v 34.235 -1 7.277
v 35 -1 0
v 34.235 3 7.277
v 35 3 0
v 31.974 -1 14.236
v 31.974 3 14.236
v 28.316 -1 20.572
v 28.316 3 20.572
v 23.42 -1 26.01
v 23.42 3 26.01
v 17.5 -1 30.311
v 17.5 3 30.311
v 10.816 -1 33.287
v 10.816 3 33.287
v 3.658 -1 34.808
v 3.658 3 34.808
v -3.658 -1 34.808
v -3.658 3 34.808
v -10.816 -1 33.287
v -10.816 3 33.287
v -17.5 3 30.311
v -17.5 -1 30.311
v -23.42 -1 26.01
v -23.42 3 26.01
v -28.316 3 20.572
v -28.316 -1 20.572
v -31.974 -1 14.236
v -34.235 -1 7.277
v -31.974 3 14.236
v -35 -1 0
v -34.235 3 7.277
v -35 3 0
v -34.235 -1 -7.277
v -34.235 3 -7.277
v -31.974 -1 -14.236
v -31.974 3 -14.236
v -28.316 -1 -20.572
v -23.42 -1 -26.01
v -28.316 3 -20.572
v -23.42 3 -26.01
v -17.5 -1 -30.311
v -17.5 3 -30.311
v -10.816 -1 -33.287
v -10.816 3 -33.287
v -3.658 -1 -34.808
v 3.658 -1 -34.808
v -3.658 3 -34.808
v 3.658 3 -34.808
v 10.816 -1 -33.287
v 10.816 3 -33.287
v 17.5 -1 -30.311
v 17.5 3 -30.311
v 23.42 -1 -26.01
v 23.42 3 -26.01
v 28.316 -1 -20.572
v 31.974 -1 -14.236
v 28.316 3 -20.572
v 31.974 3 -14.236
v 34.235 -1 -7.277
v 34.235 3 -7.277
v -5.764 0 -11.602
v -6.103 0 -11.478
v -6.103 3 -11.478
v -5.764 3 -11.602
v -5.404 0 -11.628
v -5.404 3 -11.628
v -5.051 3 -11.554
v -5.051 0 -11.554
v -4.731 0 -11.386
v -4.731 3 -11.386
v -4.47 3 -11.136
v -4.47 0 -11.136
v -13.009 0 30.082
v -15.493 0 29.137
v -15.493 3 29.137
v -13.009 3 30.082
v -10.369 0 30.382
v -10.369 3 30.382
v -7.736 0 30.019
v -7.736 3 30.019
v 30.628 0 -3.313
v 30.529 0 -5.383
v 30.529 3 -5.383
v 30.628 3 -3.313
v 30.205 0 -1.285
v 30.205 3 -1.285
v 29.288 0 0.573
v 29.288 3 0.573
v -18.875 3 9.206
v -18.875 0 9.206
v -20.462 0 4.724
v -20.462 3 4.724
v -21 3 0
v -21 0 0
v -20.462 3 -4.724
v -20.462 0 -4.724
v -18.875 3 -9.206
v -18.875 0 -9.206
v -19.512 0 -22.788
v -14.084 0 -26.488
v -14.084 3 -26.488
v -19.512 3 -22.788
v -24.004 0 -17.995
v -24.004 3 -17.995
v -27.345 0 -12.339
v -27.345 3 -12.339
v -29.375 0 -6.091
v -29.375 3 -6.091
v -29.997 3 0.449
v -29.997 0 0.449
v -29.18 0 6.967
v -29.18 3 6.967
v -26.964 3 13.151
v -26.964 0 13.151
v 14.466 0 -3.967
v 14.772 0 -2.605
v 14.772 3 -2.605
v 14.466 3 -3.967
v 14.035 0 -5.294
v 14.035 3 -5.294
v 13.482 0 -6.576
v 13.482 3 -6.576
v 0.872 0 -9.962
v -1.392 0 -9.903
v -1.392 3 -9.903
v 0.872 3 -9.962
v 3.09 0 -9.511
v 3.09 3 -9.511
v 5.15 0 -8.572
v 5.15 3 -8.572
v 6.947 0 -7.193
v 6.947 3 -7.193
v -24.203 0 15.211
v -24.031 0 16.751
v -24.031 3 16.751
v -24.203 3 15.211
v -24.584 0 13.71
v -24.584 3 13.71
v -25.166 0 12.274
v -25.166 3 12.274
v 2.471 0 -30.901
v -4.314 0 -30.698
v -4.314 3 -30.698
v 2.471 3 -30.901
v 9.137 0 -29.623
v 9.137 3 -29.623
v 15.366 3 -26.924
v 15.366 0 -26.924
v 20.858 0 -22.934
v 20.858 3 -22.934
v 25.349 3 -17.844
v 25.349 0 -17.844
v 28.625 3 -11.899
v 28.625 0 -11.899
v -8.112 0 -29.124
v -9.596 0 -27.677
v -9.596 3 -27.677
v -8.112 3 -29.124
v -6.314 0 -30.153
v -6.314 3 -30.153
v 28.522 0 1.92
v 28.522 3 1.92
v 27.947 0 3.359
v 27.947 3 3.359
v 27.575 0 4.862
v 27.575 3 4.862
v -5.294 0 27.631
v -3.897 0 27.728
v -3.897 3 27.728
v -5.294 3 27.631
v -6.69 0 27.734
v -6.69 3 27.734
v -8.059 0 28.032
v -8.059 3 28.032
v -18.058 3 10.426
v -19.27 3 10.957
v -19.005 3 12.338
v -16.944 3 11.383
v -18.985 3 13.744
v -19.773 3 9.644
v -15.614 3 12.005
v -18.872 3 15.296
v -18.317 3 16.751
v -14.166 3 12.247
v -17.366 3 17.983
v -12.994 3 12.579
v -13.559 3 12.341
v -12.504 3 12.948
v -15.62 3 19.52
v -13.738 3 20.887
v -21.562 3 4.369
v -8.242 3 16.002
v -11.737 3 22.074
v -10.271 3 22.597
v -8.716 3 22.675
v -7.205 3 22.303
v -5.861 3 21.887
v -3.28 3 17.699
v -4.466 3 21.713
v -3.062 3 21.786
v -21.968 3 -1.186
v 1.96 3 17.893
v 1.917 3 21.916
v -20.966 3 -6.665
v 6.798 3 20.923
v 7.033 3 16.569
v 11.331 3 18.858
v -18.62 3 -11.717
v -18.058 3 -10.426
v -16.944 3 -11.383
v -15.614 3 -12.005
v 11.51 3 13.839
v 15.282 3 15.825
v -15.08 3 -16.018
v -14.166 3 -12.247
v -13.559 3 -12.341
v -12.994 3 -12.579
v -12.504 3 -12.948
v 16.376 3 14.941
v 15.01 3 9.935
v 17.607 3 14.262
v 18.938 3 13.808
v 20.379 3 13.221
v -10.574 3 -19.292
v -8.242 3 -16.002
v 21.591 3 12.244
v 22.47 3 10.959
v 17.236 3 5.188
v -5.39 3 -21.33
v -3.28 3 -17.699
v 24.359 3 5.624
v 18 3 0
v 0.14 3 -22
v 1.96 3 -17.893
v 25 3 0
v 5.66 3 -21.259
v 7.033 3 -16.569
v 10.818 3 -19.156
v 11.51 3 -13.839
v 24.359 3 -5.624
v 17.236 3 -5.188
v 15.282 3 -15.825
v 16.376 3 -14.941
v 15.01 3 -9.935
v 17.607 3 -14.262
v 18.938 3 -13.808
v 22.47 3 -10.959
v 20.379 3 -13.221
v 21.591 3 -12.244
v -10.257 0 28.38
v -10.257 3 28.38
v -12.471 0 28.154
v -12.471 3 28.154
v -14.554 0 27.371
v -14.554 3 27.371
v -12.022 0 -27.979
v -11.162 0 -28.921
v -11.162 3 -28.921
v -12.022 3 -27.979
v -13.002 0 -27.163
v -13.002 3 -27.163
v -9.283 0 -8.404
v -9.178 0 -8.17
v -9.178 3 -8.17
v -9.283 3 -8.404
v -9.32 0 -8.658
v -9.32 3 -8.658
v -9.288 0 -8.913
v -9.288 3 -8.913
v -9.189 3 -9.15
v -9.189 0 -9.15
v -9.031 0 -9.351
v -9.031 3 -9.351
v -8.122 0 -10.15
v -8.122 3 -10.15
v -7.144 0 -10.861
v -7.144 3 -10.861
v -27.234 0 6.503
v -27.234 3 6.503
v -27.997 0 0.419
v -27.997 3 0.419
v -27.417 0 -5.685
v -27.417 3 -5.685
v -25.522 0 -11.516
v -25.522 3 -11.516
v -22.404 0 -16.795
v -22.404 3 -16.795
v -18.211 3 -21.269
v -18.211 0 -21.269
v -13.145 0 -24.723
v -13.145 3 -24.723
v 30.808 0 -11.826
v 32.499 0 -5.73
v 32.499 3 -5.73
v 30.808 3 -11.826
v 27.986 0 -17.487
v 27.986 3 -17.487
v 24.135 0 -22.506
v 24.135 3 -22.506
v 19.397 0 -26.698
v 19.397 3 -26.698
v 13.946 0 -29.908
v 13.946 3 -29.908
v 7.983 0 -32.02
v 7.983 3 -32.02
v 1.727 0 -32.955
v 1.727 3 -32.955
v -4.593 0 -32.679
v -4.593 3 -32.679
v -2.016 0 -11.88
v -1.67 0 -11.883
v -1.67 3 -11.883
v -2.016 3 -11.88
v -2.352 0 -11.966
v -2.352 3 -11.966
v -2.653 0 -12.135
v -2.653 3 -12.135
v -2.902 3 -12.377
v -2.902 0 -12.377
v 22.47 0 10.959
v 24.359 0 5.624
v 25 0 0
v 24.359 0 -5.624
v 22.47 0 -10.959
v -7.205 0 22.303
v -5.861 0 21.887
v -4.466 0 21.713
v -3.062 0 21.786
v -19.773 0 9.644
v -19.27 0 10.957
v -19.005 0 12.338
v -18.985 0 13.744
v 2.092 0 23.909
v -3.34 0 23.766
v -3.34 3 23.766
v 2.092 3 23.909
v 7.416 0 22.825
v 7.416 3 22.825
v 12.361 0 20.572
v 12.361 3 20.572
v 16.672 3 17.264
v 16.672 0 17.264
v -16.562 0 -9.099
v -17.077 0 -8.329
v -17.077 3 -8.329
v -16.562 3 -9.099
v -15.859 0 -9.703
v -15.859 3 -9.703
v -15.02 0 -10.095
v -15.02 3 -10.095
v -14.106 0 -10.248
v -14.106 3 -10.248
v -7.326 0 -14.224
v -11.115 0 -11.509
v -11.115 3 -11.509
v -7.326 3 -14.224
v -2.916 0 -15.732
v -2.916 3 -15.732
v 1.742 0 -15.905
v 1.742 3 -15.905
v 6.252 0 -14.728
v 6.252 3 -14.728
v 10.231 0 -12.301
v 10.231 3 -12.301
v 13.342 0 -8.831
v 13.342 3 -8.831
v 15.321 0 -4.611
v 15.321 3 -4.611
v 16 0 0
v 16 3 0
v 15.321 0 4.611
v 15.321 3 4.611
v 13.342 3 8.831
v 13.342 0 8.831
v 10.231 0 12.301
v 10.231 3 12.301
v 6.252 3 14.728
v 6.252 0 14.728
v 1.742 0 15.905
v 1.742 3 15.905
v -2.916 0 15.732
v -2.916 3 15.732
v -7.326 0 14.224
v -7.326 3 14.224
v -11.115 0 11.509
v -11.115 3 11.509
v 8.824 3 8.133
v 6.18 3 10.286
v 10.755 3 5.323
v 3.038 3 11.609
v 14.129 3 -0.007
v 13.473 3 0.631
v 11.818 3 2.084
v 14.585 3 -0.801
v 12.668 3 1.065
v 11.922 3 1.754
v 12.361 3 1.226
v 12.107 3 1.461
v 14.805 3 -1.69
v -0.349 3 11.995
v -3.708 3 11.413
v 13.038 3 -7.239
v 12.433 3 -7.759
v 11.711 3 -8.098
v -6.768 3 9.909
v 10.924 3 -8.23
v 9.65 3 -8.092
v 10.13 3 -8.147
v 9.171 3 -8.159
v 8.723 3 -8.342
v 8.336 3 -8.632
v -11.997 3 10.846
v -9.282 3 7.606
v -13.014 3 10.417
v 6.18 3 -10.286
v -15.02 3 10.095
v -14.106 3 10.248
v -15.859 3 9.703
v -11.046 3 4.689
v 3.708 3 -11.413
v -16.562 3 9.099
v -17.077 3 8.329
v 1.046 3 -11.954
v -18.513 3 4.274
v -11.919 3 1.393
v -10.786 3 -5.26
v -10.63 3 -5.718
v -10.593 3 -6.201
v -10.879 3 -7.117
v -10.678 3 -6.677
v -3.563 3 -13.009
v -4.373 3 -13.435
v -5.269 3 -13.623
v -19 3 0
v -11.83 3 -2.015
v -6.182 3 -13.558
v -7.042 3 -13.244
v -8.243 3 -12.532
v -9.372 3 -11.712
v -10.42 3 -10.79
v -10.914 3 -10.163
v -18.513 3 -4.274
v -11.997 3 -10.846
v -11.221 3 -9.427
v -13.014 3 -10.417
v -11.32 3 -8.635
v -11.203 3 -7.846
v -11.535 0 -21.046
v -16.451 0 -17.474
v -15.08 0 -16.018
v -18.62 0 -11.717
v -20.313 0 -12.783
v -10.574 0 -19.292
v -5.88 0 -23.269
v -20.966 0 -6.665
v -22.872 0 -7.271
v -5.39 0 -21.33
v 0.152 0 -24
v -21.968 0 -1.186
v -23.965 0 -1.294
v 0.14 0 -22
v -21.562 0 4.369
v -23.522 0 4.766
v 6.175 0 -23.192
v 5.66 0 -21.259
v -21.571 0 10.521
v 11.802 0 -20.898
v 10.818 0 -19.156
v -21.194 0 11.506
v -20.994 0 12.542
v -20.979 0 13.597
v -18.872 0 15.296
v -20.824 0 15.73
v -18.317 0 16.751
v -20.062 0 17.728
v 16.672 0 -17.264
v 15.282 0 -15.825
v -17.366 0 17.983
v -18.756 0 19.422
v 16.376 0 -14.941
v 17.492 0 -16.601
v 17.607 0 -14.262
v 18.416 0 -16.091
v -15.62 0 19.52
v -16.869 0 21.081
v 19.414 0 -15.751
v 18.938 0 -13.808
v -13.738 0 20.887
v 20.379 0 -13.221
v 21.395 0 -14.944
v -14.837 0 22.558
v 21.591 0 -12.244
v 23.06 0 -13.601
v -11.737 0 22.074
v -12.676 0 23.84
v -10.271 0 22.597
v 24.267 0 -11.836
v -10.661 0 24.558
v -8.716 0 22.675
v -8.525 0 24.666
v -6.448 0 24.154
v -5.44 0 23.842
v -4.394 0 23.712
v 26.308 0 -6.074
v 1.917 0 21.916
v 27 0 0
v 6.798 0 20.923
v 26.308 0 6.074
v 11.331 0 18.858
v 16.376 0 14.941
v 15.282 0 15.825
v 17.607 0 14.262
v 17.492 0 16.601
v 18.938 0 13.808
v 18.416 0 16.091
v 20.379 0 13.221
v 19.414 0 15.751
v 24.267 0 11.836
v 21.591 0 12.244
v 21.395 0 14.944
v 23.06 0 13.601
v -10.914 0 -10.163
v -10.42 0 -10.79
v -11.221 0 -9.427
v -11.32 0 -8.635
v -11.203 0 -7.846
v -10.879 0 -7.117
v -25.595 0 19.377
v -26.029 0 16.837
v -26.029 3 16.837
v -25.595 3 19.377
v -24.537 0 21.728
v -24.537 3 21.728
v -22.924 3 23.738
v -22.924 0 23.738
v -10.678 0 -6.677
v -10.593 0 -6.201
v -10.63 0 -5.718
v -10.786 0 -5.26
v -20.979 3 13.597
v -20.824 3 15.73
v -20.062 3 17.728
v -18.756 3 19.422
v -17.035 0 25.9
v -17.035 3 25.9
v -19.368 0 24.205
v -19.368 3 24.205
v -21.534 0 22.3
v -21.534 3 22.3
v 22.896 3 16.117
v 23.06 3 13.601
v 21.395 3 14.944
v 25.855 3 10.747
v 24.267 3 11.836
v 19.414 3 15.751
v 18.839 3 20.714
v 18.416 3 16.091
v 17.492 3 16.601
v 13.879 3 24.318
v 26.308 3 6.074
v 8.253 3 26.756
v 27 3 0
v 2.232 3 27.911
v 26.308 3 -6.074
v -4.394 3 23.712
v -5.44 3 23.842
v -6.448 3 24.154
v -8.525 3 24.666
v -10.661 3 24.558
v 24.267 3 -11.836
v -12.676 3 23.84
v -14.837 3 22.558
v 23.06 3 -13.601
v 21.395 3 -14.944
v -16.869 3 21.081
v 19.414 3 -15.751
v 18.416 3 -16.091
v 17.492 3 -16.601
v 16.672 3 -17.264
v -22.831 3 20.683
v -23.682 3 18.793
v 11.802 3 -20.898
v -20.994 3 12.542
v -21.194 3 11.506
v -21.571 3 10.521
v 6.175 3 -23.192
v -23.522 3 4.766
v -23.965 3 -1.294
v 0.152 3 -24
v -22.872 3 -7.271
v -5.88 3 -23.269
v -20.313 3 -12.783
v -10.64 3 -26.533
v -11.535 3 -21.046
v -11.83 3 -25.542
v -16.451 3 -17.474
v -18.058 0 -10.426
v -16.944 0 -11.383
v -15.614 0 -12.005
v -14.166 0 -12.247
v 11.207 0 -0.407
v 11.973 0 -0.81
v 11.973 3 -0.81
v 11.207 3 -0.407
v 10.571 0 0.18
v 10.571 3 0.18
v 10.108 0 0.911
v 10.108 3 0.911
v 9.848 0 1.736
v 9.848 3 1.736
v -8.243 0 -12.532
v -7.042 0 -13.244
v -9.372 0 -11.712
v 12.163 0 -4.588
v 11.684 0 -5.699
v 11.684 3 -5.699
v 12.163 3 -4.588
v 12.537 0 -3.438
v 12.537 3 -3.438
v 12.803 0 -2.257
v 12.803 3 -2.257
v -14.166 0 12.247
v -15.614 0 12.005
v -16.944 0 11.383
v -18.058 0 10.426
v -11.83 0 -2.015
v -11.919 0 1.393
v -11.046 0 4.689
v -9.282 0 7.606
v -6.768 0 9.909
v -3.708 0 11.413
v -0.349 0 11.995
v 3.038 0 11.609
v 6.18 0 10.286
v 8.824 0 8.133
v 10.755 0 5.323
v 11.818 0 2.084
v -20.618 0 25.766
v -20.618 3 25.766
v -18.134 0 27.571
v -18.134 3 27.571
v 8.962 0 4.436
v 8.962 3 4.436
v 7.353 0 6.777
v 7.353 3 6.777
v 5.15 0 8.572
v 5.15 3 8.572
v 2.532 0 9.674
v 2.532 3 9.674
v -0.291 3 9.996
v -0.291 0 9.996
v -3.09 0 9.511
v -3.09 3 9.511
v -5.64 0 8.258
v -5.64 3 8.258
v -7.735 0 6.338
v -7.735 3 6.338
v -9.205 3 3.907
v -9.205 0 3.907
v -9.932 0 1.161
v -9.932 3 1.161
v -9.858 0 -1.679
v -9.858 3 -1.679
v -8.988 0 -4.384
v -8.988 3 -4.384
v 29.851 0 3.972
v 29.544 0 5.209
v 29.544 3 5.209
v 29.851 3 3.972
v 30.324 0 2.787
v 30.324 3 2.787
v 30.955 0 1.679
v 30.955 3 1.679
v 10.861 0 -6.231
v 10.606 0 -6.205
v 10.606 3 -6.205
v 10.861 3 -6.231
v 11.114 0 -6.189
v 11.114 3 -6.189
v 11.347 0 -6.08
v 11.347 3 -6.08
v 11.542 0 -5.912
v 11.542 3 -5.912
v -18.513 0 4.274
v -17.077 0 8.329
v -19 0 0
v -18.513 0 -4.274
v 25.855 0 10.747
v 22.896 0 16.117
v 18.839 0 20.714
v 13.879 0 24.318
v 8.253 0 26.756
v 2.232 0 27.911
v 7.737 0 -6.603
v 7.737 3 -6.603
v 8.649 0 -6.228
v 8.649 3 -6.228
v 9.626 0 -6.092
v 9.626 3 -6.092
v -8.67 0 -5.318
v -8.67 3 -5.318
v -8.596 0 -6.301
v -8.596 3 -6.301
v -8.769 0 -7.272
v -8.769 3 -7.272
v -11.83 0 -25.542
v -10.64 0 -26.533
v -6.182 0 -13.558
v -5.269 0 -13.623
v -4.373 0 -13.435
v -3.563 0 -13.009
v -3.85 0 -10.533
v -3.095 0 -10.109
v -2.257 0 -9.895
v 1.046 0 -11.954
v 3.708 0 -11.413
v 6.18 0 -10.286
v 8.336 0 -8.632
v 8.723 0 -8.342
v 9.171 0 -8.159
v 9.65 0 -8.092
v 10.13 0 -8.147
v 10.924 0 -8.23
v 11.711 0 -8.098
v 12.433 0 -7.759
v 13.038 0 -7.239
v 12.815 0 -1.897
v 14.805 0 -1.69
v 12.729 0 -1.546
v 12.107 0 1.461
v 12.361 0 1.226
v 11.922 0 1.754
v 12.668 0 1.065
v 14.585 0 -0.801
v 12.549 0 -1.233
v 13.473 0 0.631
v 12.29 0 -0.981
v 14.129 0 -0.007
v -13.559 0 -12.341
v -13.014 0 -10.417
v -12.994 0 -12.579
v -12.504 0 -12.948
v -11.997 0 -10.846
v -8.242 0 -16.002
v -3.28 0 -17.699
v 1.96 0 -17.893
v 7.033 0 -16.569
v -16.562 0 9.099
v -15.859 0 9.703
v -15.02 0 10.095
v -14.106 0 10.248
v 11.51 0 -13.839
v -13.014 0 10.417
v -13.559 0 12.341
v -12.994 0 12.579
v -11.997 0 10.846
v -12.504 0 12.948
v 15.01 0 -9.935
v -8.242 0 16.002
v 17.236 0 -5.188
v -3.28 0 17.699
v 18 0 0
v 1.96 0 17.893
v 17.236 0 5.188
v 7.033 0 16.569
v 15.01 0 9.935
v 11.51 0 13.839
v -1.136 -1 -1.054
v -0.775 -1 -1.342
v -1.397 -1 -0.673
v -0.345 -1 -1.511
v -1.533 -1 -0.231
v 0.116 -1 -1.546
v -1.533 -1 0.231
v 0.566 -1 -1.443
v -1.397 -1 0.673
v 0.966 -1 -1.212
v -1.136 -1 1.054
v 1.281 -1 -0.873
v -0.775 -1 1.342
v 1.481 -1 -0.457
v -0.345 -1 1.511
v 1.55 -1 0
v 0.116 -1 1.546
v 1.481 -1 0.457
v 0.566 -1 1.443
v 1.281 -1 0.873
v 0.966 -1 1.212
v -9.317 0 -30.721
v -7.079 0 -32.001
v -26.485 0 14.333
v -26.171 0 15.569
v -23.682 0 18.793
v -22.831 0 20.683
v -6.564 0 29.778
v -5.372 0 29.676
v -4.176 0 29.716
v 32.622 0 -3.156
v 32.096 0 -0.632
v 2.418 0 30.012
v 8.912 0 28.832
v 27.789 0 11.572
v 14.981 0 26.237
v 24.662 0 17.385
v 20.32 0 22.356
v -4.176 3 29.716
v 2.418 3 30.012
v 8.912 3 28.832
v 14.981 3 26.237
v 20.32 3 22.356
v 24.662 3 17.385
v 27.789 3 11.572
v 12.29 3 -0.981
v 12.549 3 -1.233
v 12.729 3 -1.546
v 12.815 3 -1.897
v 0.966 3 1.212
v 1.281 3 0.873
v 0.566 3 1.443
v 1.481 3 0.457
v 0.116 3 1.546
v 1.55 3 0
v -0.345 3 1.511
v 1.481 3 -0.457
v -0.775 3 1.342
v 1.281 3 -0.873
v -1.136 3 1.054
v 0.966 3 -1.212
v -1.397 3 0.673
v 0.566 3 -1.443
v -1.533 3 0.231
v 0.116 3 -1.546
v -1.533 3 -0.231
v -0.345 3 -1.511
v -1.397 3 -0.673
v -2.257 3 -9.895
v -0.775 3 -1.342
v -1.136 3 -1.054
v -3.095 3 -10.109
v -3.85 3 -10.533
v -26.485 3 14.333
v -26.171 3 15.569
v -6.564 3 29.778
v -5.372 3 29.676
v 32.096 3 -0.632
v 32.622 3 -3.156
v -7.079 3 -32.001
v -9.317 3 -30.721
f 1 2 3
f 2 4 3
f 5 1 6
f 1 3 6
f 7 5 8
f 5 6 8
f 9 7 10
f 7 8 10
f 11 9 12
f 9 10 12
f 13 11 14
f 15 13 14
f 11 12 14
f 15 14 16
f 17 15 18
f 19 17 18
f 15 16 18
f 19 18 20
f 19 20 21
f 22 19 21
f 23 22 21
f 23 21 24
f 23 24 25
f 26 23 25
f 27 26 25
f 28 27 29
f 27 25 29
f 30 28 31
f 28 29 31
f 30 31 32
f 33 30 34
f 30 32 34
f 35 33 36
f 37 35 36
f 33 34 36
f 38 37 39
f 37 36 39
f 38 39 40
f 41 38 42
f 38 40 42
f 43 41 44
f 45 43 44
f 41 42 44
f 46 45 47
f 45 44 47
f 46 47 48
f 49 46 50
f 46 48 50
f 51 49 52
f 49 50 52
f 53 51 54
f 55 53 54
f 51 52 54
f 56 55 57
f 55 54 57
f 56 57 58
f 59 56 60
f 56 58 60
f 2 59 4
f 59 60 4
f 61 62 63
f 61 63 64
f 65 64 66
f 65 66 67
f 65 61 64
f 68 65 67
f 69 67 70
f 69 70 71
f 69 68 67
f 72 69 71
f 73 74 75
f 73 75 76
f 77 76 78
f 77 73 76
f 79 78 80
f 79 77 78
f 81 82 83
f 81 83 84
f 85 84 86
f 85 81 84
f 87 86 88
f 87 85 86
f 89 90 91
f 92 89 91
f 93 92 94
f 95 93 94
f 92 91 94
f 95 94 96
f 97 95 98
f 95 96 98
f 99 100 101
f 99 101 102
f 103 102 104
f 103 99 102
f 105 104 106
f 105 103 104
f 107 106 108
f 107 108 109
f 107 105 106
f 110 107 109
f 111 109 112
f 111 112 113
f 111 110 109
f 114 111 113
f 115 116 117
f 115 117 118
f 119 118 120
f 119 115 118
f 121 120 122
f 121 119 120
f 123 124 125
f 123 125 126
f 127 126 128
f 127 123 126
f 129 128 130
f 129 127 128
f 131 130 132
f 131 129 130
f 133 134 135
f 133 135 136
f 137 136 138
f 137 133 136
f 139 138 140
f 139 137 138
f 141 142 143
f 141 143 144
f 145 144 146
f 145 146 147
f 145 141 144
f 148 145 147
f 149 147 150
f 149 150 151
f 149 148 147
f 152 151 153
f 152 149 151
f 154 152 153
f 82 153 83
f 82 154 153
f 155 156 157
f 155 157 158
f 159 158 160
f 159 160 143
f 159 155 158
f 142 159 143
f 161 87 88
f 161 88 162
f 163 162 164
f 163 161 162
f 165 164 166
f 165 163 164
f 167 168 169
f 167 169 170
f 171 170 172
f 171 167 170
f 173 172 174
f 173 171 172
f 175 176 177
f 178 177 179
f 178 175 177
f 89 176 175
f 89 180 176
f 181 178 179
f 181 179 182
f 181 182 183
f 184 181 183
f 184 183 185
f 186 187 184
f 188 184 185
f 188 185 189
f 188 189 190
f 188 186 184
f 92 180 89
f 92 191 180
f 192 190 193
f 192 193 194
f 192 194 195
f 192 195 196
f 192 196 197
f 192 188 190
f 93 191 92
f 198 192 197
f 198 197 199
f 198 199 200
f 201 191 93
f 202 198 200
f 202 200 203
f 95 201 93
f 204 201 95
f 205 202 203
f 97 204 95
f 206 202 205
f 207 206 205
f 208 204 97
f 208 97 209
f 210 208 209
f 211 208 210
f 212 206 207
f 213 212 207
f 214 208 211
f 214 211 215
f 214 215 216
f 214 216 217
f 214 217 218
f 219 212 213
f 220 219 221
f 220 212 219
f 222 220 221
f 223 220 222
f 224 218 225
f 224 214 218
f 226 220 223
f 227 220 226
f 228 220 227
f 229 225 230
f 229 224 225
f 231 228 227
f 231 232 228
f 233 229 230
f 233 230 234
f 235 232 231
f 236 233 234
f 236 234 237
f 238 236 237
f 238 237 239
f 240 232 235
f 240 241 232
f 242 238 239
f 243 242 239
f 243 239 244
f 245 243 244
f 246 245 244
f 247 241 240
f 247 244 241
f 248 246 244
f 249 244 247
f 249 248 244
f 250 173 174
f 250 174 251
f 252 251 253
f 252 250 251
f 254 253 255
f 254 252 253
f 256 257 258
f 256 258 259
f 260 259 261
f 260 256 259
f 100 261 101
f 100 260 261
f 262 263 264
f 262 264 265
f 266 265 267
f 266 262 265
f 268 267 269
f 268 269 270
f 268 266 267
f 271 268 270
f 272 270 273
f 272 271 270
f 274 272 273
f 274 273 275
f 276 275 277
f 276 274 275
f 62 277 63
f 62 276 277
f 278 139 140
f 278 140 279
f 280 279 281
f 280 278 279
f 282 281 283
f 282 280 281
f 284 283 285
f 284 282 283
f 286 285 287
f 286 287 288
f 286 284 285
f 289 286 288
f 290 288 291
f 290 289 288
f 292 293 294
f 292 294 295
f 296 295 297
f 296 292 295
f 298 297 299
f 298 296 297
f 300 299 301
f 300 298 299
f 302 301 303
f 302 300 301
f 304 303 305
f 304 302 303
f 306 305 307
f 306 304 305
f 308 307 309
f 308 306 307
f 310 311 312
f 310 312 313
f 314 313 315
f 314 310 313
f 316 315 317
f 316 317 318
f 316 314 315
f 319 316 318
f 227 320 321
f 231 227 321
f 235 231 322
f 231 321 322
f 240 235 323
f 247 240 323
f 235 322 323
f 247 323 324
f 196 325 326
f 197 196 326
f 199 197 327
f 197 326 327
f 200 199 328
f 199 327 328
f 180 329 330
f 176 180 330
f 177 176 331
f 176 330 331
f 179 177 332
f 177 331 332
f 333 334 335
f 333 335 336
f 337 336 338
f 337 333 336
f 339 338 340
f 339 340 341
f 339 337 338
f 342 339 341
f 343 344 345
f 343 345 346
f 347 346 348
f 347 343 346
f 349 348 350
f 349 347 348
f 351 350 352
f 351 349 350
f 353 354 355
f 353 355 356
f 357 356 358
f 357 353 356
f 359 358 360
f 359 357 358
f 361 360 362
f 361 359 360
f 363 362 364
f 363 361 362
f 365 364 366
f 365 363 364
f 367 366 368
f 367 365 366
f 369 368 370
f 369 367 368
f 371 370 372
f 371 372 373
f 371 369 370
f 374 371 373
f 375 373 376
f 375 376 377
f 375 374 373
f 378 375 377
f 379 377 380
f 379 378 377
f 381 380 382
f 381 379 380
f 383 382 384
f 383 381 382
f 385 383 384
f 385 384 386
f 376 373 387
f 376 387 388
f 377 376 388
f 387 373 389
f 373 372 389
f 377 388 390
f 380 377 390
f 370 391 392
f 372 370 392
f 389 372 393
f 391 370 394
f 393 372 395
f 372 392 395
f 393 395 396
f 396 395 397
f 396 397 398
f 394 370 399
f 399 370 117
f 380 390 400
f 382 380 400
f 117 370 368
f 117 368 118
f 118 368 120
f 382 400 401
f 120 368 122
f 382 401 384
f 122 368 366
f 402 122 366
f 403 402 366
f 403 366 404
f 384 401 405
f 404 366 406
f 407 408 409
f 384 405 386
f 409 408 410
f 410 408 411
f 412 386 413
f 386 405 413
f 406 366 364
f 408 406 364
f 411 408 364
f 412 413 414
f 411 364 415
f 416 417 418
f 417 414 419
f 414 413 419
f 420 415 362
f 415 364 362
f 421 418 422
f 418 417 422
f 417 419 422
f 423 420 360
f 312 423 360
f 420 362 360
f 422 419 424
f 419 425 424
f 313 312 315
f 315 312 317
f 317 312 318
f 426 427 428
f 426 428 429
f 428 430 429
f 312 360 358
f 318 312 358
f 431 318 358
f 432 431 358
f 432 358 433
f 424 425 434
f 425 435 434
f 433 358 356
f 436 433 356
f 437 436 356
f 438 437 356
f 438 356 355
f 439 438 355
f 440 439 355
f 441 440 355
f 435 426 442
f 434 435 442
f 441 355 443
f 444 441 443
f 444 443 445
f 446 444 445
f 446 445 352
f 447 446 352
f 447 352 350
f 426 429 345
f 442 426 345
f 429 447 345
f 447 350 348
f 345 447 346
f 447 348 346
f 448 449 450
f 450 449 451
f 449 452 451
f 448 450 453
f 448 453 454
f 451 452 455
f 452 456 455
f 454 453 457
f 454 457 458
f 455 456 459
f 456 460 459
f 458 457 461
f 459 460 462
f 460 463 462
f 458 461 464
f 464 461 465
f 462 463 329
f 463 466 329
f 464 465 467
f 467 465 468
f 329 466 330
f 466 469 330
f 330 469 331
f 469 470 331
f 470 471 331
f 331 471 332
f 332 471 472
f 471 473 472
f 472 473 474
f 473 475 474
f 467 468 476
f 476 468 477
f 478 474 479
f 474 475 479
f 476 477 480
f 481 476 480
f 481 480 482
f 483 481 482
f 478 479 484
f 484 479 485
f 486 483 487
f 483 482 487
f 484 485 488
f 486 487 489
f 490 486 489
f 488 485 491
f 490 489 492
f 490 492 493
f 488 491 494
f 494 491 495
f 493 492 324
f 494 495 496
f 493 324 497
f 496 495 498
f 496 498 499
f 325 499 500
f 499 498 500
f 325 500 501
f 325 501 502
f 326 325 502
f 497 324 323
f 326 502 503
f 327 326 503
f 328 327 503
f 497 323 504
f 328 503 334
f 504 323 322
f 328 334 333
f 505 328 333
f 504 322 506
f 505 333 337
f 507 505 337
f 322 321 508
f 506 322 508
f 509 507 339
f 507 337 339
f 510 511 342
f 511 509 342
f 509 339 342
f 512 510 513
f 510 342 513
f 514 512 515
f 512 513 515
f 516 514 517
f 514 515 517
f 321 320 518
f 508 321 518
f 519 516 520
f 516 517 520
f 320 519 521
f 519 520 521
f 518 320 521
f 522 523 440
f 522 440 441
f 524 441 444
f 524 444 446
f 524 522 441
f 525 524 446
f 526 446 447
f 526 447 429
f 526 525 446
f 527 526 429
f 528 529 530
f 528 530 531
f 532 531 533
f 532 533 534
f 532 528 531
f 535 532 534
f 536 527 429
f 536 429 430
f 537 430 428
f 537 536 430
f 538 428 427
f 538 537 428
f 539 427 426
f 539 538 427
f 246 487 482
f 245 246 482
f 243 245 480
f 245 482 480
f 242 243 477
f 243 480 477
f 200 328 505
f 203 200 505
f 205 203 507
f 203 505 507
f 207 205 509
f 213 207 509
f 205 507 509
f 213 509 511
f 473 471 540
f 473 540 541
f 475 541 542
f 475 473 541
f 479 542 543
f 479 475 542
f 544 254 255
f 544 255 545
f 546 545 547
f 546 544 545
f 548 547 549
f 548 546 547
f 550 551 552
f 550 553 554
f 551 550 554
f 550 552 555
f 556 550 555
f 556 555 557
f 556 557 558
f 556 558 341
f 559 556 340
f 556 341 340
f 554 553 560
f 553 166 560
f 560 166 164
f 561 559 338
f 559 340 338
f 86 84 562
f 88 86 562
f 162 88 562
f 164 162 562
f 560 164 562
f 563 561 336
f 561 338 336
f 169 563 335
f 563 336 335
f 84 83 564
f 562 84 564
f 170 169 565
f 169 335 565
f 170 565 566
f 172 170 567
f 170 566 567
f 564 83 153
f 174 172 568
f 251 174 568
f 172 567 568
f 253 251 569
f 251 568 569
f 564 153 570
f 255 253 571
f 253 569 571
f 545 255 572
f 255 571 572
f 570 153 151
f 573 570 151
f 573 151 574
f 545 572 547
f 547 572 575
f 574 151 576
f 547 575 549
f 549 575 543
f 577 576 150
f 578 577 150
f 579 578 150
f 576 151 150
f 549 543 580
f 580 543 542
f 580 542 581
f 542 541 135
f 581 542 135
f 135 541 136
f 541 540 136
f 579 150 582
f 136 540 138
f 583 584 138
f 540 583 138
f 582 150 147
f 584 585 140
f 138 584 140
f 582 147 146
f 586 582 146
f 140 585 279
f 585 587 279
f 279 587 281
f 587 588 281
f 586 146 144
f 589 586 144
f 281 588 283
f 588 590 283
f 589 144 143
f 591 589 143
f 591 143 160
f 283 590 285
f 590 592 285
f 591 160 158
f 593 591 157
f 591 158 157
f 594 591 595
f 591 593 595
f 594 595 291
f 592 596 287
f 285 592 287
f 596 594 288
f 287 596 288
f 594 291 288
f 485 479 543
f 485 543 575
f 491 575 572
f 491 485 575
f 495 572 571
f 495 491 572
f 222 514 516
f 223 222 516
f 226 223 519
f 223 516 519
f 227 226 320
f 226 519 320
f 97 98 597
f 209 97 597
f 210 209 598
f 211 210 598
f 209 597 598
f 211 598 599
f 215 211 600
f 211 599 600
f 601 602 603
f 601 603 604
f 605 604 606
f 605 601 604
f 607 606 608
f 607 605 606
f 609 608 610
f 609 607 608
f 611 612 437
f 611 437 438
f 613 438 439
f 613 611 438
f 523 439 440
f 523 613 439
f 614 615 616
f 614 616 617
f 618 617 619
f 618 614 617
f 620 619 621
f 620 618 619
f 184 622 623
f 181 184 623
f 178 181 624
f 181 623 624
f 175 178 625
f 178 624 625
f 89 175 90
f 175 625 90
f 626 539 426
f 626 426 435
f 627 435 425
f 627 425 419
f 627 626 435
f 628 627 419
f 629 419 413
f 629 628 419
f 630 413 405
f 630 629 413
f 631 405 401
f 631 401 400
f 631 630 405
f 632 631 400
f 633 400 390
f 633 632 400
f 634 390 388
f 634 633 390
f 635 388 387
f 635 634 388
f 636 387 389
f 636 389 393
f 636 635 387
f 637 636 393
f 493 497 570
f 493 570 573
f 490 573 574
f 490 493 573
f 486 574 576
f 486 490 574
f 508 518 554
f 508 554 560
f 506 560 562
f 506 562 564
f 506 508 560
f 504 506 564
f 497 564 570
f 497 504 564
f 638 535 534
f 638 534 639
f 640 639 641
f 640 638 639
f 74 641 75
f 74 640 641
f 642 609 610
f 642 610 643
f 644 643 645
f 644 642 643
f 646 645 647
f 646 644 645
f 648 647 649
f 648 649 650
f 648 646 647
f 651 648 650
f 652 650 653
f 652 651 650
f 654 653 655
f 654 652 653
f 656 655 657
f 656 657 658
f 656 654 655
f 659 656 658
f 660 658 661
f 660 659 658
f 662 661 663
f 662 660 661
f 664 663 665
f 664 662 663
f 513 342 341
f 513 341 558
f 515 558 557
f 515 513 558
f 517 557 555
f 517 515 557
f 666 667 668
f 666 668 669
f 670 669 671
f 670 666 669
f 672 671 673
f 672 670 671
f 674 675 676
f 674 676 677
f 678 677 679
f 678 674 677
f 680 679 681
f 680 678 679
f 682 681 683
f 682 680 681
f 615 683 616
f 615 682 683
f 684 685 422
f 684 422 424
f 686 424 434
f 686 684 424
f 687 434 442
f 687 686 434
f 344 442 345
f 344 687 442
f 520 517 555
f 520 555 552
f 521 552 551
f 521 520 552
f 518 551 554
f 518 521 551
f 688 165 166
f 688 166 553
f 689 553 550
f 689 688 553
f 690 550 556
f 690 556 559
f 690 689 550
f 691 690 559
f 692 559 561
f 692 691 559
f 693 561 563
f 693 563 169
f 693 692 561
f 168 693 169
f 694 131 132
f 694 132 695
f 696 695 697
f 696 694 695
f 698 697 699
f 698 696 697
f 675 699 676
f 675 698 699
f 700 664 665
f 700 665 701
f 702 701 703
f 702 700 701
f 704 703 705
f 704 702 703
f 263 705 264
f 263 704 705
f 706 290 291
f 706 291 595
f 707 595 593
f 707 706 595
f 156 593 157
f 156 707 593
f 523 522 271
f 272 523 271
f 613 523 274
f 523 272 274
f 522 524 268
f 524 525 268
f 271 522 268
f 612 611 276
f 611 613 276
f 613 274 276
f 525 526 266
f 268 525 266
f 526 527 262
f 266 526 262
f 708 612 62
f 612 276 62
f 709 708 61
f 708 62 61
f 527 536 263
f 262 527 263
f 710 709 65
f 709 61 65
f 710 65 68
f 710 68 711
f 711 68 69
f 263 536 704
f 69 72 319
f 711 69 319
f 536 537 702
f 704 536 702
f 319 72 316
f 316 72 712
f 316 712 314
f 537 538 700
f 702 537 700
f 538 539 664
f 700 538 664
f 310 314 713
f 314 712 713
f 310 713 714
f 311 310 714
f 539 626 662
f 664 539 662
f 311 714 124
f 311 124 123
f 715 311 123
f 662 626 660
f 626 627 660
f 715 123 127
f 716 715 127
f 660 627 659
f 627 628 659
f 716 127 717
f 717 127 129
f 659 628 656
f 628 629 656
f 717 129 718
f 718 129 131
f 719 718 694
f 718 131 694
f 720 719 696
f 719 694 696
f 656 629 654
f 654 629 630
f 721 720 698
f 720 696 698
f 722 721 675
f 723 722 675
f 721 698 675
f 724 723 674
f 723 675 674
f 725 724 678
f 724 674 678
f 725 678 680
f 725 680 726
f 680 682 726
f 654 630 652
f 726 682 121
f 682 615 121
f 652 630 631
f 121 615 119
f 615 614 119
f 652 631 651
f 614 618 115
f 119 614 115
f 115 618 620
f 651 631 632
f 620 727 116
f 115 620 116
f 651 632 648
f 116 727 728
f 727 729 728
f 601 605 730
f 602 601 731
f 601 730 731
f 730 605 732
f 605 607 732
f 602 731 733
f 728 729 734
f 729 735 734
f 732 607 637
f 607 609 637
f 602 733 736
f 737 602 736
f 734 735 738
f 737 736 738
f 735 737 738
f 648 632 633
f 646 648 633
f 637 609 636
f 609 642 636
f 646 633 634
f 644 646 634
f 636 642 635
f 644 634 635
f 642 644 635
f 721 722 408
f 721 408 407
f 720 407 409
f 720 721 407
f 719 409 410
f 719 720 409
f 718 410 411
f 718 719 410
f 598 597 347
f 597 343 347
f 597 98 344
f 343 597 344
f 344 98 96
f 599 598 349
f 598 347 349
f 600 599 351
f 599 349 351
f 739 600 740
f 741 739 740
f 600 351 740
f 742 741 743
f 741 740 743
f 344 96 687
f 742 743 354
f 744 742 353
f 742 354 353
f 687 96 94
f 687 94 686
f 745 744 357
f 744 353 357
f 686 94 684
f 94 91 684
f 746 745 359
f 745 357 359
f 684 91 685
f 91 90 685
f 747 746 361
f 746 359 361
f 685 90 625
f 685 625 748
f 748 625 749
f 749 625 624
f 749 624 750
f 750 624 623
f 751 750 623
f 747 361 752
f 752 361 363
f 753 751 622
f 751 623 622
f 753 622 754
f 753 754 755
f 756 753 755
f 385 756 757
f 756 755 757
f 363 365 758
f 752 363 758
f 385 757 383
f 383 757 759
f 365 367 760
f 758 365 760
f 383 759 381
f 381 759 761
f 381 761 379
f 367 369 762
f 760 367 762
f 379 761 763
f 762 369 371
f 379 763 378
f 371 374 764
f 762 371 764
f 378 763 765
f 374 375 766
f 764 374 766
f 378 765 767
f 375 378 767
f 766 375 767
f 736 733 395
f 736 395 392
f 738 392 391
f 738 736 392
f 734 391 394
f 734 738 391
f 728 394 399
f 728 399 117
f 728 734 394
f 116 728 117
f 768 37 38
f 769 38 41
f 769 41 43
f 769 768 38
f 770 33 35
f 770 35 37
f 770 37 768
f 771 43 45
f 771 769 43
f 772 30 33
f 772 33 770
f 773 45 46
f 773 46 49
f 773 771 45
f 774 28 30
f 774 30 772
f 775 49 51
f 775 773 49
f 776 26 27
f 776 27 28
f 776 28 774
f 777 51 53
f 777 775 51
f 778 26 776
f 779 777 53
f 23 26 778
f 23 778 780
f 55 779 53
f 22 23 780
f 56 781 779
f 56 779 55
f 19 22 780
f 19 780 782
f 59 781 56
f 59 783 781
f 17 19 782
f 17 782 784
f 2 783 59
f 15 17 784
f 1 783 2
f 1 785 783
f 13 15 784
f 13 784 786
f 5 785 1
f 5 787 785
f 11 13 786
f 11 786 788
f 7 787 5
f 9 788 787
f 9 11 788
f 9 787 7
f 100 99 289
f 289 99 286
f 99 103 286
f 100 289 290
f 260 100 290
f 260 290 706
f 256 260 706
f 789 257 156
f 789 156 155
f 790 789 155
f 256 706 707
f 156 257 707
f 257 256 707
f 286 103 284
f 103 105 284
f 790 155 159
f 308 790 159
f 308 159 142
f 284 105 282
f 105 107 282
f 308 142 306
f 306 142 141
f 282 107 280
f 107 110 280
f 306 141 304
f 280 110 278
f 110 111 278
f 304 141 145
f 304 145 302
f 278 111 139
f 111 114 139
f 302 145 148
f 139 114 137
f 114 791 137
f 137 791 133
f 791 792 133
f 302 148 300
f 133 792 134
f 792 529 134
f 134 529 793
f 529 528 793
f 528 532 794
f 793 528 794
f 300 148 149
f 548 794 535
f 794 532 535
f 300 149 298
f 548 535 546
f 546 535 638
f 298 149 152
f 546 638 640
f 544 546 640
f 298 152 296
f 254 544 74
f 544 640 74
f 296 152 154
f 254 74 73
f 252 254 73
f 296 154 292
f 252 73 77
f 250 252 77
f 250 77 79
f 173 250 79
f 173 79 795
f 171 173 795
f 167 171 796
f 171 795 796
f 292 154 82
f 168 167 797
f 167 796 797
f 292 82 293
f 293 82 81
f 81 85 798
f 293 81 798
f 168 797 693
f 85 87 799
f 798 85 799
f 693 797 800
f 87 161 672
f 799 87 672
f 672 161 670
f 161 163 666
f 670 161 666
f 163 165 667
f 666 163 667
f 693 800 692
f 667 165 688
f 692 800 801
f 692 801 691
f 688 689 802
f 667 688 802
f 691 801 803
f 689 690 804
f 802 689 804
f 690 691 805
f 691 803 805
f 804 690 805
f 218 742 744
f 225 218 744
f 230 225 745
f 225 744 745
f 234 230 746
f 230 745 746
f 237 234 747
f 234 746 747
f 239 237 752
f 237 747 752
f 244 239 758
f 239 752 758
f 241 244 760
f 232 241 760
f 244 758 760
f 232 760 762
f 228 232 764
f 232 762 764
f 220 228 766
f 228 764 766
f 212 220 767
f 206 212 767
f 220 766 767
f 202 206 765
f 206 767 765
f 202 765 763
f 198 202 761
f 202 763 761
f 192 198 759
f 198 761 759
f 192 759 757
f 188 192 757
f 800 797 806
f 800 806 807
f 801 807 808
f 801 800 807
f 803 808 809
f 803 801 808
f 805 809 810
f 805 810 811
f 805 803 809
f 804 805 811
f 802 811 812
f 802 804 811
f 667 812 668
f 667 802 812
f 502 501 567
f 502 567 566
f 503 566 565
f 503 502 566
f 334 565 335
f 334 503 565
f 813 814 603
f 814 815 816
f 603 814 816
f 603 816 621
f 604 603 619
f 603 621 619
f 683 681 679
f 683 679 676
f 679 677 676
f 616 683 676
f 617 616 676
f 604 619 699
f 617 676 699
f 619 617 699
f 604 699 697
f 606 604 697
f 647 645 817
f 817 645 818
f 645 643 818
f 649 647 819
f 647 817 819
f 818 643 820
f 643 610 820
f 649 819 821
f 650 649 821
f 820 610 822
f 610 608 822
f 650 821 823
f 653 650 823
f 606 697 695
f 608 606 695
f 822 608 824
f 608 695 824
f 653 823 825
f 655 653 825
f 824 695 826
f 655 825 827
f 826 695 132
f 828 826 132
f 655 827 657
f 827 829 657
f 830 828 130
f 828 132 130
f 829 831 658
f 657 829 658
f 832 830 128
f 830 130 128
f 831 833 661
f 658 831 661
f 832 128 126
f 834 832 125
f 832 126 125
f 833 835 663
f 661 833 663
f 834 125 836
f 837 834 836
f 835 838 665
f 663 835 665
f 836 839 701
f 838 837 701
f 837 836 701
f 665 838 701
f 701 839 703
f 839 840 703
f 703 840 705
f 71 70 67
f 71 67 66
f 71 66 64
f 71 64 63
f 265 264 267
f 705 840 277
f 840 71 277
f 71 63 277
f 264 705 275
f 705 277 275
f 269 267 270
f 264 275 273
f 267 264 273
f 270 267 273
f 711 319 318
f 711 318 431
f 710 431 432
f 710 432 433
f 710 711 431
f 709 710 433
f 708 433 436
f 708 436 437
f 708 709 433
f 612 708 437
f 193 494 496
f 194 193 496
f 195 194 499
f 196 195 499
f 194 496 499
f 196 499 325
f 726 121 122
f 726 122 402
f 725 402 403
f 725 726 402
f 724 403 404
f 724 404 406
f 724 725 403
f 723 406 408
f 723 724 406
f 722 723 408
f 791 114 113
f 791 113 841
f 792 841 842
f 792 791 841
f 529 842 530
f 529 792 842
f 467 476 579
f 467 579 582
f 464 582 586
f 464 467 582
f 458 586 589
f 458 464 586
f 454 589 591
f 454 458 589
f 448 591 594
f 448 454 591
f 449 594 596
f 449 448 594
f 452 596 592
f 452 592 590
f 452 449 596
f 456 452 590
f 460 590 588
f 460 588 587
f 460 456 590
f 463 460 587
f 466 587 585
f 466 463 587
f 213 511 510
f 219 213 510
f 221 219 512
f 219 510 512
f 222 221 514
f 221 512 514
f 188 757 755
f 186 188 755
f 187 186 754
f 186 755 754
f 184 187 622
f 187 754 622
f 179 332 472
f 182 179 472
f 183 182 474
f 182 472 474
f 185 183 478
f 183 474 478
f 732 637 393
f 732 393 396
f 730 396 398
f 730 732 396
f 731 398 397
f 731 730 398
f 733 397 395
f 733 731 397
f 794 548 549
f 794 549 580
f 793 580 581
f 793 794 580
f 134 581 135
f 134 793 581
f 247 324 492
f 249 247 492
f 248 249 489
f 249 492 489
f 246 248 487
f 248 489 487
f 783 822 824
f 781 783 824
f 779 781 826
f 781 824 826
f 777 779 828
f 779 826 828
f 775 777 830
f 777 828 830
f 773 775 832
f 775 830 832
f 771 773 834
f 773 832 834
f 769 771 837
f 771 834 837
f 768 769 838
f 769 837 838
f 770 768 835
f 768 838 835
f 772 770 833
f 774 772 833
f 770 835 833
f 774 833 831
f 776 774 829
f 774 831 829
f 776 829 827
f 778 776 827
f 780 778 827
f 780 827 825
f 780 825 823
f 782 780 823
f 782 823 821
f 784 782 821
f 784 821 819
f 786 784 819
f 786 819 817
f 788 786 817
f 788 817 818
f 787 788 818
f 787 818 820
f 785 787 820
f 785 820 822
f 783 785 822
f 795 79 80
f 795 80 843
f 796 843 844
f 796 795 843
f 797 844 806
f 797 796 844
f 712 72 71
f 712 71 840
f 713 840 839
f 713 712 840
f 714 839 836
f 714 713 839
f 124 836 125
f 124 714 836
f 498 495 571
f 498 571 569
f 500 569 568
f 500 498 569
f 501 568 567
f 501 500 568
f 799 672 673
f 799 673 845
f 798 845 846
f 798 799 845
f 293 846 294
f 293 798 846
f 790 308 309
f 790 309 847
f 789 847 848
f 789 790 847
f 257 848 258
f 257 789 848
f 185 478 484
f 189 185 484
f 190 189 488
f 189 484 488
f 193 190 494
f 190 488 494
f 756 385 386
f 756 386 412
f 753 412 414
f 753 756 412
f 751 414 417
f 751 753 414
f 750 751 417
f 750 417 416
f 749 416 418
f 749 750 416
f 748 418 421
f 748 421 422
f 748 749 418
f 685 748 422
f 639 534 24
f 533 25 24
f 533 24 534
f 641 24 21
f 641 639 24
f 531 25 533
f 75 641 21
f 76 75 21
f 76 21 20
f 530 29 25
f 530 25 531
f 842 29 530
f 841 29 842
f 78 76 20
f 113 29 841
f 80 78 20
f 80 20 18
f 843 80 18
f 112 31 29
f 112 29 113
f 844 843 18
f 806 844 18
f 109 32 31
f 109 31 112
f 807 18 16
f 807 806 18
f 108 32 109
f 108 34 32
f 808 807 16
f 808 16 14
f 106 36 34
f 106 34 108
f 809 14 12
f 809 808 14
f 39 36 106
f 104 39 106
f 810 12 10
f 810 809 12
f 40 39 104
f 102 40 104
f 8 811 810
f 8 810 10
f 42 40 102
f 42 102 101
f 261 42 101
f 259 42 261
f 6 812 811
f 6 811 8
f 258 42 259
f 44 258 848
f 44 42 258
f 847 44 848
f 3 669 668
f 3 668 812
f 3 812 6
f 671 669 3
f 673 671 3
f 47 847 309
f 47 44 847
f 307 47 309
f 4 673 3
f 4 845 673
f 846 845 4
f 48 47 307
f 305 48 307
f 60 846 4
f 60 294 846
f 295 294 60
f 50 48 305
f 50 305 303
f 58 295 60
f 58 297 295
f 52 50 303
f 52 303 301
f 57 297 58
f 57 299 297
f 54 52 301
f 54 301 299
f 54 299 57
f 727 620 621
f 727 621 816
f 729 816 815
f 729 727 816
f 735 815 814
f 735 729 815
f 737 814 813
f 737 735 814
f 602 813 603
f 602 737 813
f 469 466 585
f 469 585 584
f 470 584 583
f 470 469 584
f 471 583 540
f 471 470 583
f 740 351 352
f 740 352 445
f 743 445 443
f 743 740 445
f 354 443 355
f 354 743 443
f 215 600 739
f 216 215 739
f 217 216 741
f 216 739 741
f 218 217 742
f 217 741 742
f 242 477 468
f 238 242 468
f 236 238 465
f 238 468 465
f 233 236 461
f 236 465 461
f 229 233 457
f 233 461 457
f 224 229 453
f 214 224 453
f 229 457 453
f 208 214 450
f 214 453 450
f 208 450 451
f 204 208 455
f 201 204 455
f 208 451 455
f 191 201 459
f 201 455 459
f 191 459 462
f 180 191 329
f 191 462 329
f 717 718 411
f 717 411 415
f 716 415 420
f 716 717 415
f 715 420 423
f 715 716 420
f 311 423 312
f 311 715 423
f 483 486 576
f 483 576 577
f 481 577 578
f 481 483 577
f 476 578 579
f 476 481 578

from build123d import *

# Parameters (mm, degrees)
EXTRUDE_1_DEPTH     = 3
EXTRUDE_1_2_DEPTH   = 3
EXTRUDE_1_3_DEPTH   = 3
EXTRUDE_1_4_DEPTH   = 3
SKETCH_1_R          = 35
EXTRUDE_1_5_DEPTH   = 3
SKETCH_3_R          = 35
EXTRUDE_2_DEPTH     = 1
SKETCH_4_R          = 1.55
CUT_EXTRUDE_1_DEPTH = 5


with BuildPart() as part:
    # 草图1 → 凸台-拉伸1 (new body)
    with BuildSketch(Plane(origin=(0, 0, 0), x_dir=(1, 0, 0), z_dir=(0, 1, 0))):
        with BuildLine():
            ThreePointArc((-8.987940463, 4.383711468), (-8.595708593, 6.301111944), (-9.178240759, 8.169514123))
            ThreePointArc((-9.178240759, 8.169514123), (-9.312956952, 8.786525533), (-9.030558816, 9.351417404))
            ThreePointArc((-9.030558816, 9.351417404), (-7.64120828, 10.517220927), (-6.103130316, 11.478318707))
            ThreePointArc((-6.103130316, 11.478318707), (-5.224804474, 11.603054959), (-4.470435457, 11.136211511))
            ThreePointArc((-4.470435457, 11.136211511), (-3.095389379, 10.109363067), (-1.39173101, 9.902680687))
            ThreePointArc((-1.39173101, 9.902680687), (3.090169944, 9.510565163), (6.946583705, 7.193398003))
            ThreePointArc((6.946583705, 7.193398003), (8.648933609, 6.227853996), (10.605902015, 6.204506982))
            ThreePointArc((10.605902015, 6.204506982), (11.23434433, 6.141962683), (11.684322602, 5.698824908))
            ThreePointArc((11.684322602, 5.698824908), (12.363734712, 4.017220927), (12.802500789, 2.25742631))
            ThreePointArc((12.802500789, 2.25742631), (12.649714402, 1.383543172), (11.972607053, 0.810358162))
            ThreePointArc((11.972607053, 0.810358162), (10.571103543, -0.180074751), (9.84807753, -1.736481777))
            ThreePointArc((9.84807753, -1.736481777), (-3.090169944, -9.510565163), (-8.987940463, 4.383711468))
        make_face()
    extrude(amount=EXTRUDE_1_DEPTH)



with BuildPart() as body_2:
    # 草图1 → Extrude 1 2 (new body)
    with BuildSketch(Plane(origin=(0, 0, 0), x_dir=(1, 0, 0), z_dir=(0, 1, 0))):
        with BuildLine():
            ThreePointArc((-11.114533927, -11.509436805), (-12.492455263, -10.599830784), (-14.105693288, -10.248386061))
            ThreePointArc((-14.105693288, -10.248386061), (-15.858793025, -9.702695478), (-17.07708688, -8.329051789))
            ThreePointArc((-17.07708688, -8.329051789), (-19, 0), (-17.07708688, 8.329051789))
            ThreePointArc((-17.07708688, 8.329051789), (-15.858793025, 9.702695478), (-14.105693288, 10.248386061))
            ThreePointArc((-14.105693288, 10.248386061), (-12.492455263, 10.599830784), (-11.114533927, 11.509436805))
            ThreePointArc((-11.114533927, 11.509436805), (16, 0), (-11.114533927, -11.509436805))
        make_face()
        with BuildLine():
            ThreePointArc((-10.785528556, 5.260453761), (-3.708203932, -11.412678196), (11.817693036, -2.083778132))
            ThreePointArc((11.817693036, -2.083778132), (12.10690446, -1.461213129), (12.667507838, -1.065038569))
            ThreePointArc((12.667507838, -1.065038569), (14.384650397, 0.388557195), (14.772116295, 2.604722665))
            ThreePointArc((14.772116295, 2.604722665), (14.265847744, 4.635254916), (13.481910694, 6.575567202))
            ThreePointArc((13.481910694, 6.575567202), (12.083449441, 7.952769275), (10.130350184, 8.147147056))
            ThreePointArc((10.130350184, 8.147147056), (9.17069564, 8.158595921), (8.335900446, 8.632077604))
            ThreePointArc((8.335900446, 8.632077604), (3.708203932, 11.412678196), (-1.670077212, 11.883216825))
            ThreePointArc((-1.670077212, 11.883216825), (-2.351542959, 11.965890068), (-2.901563328, 12.376630892))
            ThreePointArc((-2.901563328, 12.376630892), (-4.814641283, 13.560544718), (-7.042073442, 13.244213893))
            ThreePointArc((-7.042073442, 13.244213893), (-8.816778784, 12.135254916), (-10.419875557, 10.790097005))
            ThreePointArc((-10.419875557, 10.790097005), (-11.297524269, 9.034502472), (-10.878847662, 7.116928659))
            ThreePointArc((-10.878847662, 7.116928659), (-10.593186617, 6.200705058), (-10.785528556, 5.260453761))
        make_face(mode=Mode.SUBTRACT)
    extrude(amount=EXTRUDE_1_2_DEPTH)


with BuildPart() as body_3:
    # 草图1 → Extrude 1 3 (new body)
    with BuildSketch(Plane(origin=(0, 0, 0), x_dir=(1, 0, 0), z_dir=(0, 1, 0))):
        with BuildLine():
            ThreePointArc((18.937750033, -13.8084093), (21.021041042, -12.777130739), (22.469851157, -10.95927867))
            ThreePointArc((22.469851157, -10.95927867), (25, 0), (22.469851157, 10.95927867))
            ThreePointArc((22.469851157, 10.95927867), (21.021041042, 12.777130739), (18.937750033, 13.8084093))
            ThreePointArc((18.937750033, 13.8084093), (16.976365134, 14.574561246), (15.28248415, 15.825475607))
            ThreePointArc((15.28248415, 15.825475607), (-12.93127555, 17.798373876), (-19.773469019, -9.644165229))
            ThreePointArc((-19.773469019, -9.644165229), (-19.107216775, -11.641695573), (-18.98466424, -13.743837434))
            ThreePointArc((-18.98466424, -13.743837434), (-18.647632371, -16.043847525), (-17.366459261, -17.983495008))
            ThreePointArc((-17.366459261, -17.983495008), (-14.694631307, -20.225424859), (-11.73678907, -22.073689821))
            ThreePointArc((-11.73678907, -22.073689821), (-9.496170427, -22.69277382), (-7.204582268, -22.302567971))
            ThreePointArc((-7.204582268, -22.302567971), (-5.167455737, -21.769524797), (-3.061808221, -21.785897512))
            ThreePointArc((-3.061808221, -21.785897512), (6.798373876, -20.923243358), (15.28248415, -15.825475607))
            ThreePointArc((15.28248415, -15.825475607), (16.976365134, -14.574561246), (18.937750033, -13.8084093))
        make_face()
        with BuildLine():
            ThreePointArc((-12.503850668, -12.948116406), (-13.269414492, -12.44274542), (-14.165718687, -12.247485096))
            ThreePointArc((-14.165718687, -12.247485096), (-16.943967267, -11.382694545), (-18.874674972, -9.205794083))
            ThreePointArc((-18.874674972, -9.205794083), (-21, 0), (-18.874674972, 9.205794083))
            ThreePointArc((-18.874674972, 9.205794083), (-16.943967267, 11.382694545), (-14.165718687, 12.247485096))
            ThreePointArc((-14.165718687, 12.247485096), (-13.269414492, 12.44274542), (-12.503850668, 12.948116406))
            ThreePointArc((-12.503850668, 12.948116406), (18, 0), (-12.503850668, -12.948116406))
        make_face(mode=Mode.SUBTRACT)
    extrude(amount=EXTRUDE_1_3_DEPTH)


with BuildPart() as body_4:
    # 草图1 → Extrude 1 4 (new body)
    with BuildSketch(Plane(origin=(0, 0, 0), x_dir=(1, 0, 0), z_dir=(0, 1, 0))):
        with BuildLine():
            ThreePointArc((-4.31436613, 30.698310131), (18.221342821, 25.079526826), (30.529040343, 5.383093508))
            ThreePointArc((30.529040343, 5.383093508), (30.48111684, 2.285468824), (29.287623908, -0.573403325))
            ThreePointArc((29.287623908, -0.573403325), (28.210037241, -2.62947128), (27.574617084, -4.862148975))
            ThreePointArc((27.574617084, -4.862148975), (16.457987064, -22.652475842), (-3.896846827, -27.727505925))
            ThreePointArc((-3.896846827, -27.727505925), (-5.993969283, -27.657741779), (-8.058542774, -28.03234281))
            ThreePointArc((-8.058542774, -28.03234281), (-11.37088699, -28.338686756), (-14.553618446, -27.371375379))
            ThreePointArc((-14.553618446, -27.371375379), (-18.221342821, -25.079526826), (-21.534409484, -22.29953381))
            ThreePointArc((-21.534409484, -22.29953381), (-23.316376662, -19.765334071), (-24.031223485, -16.750940373))
            ThreePointArc((-24.031223485, -16.750940373), (-24.36796398, -14.454156905), (-25.166233296, -12.27439211))
            ThreePointArc((-25.166233296, -12.27439211), (-26.629582456, 8.652475843), (-13.145203758, 24.7225326))
            ThreePointArc((-13.145203758, 24.7225326), (-11.218156715, 26.016788431), (-9.595712481, 27.676994193))
            ThreePointArc((-9.595712481, 27.676994193), (-7.245573093, 29.695513501), (-4.31436613, 30.698310131))
        make_face()
        with BuildLine():
            ThreePointArc((24.26743925, -11.836020963), (27, 0), (24.26743925, 11.836020963))
            ThreePointArc((24.26743925, 11.836020963), (22.276722717, 14.333814244), (19.414206911, 15.750827598))
            ThreePointArc((19.414206911, 15.750827598), (17.942654929, 16.325642065), (16.671800891, 17.264155208))
            ThreePointArc((16.671800891, 17.264155208), (-14.106846055, 19.416407865), (-21.571057111, -10.520907523))
            ThreePointArc((-21.571057111, -10.520907523), (-21.071193566, -12.019578048), (-20.979247092, -13.596734588))
            ThreePointArc((-20.979247092, -13.596734588), (-20.516153338, -16.757030106), (-18.755776002, -19.422174609))
            ThreePointArc((-18.755776002, -19.422174609), (-15.870201812, -21.843458848), (-12.675732195, -23.839585007))
            ThreePointArc((-12.675732195, -23.839585007), (-9.597042635, -24.6902284), (-6.448319149, -24.15407171))
            ThreePointArc((-6.448319149, -24.15407171), (-4.919941122, -23.754149829), (-3.340154423, -23.76643365))
            ThreePointArc((-3.340154423, -23.76643365), (7.416407865, -22.825356391), (16.671800891, -17.264155208))
            ThreePointArc((16.671800891, -17.264155208), (17.942654929, -16.325642065), (19.414206911, -15.750827598))
            ThreePointArc((19.414206911, -15.750827598), (22.276722717, -14.333814244), (24.26743925, -11.836020963))
        make_face(mode=Mode.SUBTRACT)
    extrude(amount=EXTRUDE_1_4_DEPTH)


with BuildPart() as body_5:
    # 草图1 → Extrude 1 5 (new body)
    with BuildSketch(Plane(origin=(0, 0, 0), x_dir=(1, 0, 0), z_dir=(0, 1, 0))):
        Circle(SKETCH_1_R)
        with BuildLine():
            ThreePointArc((-4.592712332, 32.678846268), (-8.238694275, 31.431517625), (-11.161915282, 28.920782272))
            ThreePointArc((-11.161915282, 28.920782272), (-12.497644107, 27.553965069), (-14.084146884, 26.488427786))
            ThreePointArc((-14.084146884, 26.488427786), (-28.531695489, 9.270509831), (-26.963821389, -13.151134404))
            ThreePointArc((-26.963821389, -13.151134404), (-26.306620782, -14.945695108), (-26.029388457, -16.836595159))
            ThreePointArc((-26.029388457, -16.836595159), (-25.140226197, -20.586048925), (-22.923726225, -23.738213411))
            ThreePointArc((-22.923726225, -23.738213411), (-19.396913326, -26.697560814), (-15.492561572, -29.137270564))
            ThreePointArc((-15.492561572, -29.137270564), (-11.698213434, -30.314961384), (-7.736329089, -30.019147427))
            ThreePointArc((-7.736329089, -30.019147427), (-5.969810062, -29.709434307), (-4.176359771, -29.716343862))
            ThreePointArc((-4.176359771, -29.716343862), (17.759481282, -24.44665794), (29.54423259, -5.20944533))
            ThreePointArc((29.54423259, -5.20944533), (30.067362447, -3.371322398), (30.954519948, -1.678599051))
            ThreePointArc((30.954519948, -1.678599051), (32.439046197, 1.87740923), (32.498655849, 5.730389863))
            ThreePointArc((32.498655849, 5.730389863), (19.396913326, 26.697560814), (-4.592712332, 32.678846268))
        make_face(mode=Mode.SUBTRACT)
    extrude(amount=EXTRUDE_1_5_DEPTH)


with BuildPart() as part_1:
    add(part.part)

    add(body_2.part)  # 凸台-拉伸2 merges body 2

    add(body_3.part)  # 凸台-拉伸2 merges body 3

    add(body_4.part)  # 凸台-拉伸2 merges body 4

    add(body_5.part)  # 凸台-拉伸2 merges body 5
    # 草图3 → 凸台-拉伸2 (add)
    with BuildSketch(Plane.XZ):
        Circle(SKETCH_3_R)
    extrude(amount=EXTRUDE_2_DEPTH)

    # 草图4 → 切除-拉伸1 (cut, through all)
    with BuildSketch(Plane(origin=(0, 3, 0), x_dir=(1, 0, 0), z_dir=(0, 1, 0))):
        Circle(SKETCH_4_R)
    extrude(amount=-CUT_EXTRUDE_1_DEPTH, mode=Mode.SUBTRACT)


solid = part_1.part
